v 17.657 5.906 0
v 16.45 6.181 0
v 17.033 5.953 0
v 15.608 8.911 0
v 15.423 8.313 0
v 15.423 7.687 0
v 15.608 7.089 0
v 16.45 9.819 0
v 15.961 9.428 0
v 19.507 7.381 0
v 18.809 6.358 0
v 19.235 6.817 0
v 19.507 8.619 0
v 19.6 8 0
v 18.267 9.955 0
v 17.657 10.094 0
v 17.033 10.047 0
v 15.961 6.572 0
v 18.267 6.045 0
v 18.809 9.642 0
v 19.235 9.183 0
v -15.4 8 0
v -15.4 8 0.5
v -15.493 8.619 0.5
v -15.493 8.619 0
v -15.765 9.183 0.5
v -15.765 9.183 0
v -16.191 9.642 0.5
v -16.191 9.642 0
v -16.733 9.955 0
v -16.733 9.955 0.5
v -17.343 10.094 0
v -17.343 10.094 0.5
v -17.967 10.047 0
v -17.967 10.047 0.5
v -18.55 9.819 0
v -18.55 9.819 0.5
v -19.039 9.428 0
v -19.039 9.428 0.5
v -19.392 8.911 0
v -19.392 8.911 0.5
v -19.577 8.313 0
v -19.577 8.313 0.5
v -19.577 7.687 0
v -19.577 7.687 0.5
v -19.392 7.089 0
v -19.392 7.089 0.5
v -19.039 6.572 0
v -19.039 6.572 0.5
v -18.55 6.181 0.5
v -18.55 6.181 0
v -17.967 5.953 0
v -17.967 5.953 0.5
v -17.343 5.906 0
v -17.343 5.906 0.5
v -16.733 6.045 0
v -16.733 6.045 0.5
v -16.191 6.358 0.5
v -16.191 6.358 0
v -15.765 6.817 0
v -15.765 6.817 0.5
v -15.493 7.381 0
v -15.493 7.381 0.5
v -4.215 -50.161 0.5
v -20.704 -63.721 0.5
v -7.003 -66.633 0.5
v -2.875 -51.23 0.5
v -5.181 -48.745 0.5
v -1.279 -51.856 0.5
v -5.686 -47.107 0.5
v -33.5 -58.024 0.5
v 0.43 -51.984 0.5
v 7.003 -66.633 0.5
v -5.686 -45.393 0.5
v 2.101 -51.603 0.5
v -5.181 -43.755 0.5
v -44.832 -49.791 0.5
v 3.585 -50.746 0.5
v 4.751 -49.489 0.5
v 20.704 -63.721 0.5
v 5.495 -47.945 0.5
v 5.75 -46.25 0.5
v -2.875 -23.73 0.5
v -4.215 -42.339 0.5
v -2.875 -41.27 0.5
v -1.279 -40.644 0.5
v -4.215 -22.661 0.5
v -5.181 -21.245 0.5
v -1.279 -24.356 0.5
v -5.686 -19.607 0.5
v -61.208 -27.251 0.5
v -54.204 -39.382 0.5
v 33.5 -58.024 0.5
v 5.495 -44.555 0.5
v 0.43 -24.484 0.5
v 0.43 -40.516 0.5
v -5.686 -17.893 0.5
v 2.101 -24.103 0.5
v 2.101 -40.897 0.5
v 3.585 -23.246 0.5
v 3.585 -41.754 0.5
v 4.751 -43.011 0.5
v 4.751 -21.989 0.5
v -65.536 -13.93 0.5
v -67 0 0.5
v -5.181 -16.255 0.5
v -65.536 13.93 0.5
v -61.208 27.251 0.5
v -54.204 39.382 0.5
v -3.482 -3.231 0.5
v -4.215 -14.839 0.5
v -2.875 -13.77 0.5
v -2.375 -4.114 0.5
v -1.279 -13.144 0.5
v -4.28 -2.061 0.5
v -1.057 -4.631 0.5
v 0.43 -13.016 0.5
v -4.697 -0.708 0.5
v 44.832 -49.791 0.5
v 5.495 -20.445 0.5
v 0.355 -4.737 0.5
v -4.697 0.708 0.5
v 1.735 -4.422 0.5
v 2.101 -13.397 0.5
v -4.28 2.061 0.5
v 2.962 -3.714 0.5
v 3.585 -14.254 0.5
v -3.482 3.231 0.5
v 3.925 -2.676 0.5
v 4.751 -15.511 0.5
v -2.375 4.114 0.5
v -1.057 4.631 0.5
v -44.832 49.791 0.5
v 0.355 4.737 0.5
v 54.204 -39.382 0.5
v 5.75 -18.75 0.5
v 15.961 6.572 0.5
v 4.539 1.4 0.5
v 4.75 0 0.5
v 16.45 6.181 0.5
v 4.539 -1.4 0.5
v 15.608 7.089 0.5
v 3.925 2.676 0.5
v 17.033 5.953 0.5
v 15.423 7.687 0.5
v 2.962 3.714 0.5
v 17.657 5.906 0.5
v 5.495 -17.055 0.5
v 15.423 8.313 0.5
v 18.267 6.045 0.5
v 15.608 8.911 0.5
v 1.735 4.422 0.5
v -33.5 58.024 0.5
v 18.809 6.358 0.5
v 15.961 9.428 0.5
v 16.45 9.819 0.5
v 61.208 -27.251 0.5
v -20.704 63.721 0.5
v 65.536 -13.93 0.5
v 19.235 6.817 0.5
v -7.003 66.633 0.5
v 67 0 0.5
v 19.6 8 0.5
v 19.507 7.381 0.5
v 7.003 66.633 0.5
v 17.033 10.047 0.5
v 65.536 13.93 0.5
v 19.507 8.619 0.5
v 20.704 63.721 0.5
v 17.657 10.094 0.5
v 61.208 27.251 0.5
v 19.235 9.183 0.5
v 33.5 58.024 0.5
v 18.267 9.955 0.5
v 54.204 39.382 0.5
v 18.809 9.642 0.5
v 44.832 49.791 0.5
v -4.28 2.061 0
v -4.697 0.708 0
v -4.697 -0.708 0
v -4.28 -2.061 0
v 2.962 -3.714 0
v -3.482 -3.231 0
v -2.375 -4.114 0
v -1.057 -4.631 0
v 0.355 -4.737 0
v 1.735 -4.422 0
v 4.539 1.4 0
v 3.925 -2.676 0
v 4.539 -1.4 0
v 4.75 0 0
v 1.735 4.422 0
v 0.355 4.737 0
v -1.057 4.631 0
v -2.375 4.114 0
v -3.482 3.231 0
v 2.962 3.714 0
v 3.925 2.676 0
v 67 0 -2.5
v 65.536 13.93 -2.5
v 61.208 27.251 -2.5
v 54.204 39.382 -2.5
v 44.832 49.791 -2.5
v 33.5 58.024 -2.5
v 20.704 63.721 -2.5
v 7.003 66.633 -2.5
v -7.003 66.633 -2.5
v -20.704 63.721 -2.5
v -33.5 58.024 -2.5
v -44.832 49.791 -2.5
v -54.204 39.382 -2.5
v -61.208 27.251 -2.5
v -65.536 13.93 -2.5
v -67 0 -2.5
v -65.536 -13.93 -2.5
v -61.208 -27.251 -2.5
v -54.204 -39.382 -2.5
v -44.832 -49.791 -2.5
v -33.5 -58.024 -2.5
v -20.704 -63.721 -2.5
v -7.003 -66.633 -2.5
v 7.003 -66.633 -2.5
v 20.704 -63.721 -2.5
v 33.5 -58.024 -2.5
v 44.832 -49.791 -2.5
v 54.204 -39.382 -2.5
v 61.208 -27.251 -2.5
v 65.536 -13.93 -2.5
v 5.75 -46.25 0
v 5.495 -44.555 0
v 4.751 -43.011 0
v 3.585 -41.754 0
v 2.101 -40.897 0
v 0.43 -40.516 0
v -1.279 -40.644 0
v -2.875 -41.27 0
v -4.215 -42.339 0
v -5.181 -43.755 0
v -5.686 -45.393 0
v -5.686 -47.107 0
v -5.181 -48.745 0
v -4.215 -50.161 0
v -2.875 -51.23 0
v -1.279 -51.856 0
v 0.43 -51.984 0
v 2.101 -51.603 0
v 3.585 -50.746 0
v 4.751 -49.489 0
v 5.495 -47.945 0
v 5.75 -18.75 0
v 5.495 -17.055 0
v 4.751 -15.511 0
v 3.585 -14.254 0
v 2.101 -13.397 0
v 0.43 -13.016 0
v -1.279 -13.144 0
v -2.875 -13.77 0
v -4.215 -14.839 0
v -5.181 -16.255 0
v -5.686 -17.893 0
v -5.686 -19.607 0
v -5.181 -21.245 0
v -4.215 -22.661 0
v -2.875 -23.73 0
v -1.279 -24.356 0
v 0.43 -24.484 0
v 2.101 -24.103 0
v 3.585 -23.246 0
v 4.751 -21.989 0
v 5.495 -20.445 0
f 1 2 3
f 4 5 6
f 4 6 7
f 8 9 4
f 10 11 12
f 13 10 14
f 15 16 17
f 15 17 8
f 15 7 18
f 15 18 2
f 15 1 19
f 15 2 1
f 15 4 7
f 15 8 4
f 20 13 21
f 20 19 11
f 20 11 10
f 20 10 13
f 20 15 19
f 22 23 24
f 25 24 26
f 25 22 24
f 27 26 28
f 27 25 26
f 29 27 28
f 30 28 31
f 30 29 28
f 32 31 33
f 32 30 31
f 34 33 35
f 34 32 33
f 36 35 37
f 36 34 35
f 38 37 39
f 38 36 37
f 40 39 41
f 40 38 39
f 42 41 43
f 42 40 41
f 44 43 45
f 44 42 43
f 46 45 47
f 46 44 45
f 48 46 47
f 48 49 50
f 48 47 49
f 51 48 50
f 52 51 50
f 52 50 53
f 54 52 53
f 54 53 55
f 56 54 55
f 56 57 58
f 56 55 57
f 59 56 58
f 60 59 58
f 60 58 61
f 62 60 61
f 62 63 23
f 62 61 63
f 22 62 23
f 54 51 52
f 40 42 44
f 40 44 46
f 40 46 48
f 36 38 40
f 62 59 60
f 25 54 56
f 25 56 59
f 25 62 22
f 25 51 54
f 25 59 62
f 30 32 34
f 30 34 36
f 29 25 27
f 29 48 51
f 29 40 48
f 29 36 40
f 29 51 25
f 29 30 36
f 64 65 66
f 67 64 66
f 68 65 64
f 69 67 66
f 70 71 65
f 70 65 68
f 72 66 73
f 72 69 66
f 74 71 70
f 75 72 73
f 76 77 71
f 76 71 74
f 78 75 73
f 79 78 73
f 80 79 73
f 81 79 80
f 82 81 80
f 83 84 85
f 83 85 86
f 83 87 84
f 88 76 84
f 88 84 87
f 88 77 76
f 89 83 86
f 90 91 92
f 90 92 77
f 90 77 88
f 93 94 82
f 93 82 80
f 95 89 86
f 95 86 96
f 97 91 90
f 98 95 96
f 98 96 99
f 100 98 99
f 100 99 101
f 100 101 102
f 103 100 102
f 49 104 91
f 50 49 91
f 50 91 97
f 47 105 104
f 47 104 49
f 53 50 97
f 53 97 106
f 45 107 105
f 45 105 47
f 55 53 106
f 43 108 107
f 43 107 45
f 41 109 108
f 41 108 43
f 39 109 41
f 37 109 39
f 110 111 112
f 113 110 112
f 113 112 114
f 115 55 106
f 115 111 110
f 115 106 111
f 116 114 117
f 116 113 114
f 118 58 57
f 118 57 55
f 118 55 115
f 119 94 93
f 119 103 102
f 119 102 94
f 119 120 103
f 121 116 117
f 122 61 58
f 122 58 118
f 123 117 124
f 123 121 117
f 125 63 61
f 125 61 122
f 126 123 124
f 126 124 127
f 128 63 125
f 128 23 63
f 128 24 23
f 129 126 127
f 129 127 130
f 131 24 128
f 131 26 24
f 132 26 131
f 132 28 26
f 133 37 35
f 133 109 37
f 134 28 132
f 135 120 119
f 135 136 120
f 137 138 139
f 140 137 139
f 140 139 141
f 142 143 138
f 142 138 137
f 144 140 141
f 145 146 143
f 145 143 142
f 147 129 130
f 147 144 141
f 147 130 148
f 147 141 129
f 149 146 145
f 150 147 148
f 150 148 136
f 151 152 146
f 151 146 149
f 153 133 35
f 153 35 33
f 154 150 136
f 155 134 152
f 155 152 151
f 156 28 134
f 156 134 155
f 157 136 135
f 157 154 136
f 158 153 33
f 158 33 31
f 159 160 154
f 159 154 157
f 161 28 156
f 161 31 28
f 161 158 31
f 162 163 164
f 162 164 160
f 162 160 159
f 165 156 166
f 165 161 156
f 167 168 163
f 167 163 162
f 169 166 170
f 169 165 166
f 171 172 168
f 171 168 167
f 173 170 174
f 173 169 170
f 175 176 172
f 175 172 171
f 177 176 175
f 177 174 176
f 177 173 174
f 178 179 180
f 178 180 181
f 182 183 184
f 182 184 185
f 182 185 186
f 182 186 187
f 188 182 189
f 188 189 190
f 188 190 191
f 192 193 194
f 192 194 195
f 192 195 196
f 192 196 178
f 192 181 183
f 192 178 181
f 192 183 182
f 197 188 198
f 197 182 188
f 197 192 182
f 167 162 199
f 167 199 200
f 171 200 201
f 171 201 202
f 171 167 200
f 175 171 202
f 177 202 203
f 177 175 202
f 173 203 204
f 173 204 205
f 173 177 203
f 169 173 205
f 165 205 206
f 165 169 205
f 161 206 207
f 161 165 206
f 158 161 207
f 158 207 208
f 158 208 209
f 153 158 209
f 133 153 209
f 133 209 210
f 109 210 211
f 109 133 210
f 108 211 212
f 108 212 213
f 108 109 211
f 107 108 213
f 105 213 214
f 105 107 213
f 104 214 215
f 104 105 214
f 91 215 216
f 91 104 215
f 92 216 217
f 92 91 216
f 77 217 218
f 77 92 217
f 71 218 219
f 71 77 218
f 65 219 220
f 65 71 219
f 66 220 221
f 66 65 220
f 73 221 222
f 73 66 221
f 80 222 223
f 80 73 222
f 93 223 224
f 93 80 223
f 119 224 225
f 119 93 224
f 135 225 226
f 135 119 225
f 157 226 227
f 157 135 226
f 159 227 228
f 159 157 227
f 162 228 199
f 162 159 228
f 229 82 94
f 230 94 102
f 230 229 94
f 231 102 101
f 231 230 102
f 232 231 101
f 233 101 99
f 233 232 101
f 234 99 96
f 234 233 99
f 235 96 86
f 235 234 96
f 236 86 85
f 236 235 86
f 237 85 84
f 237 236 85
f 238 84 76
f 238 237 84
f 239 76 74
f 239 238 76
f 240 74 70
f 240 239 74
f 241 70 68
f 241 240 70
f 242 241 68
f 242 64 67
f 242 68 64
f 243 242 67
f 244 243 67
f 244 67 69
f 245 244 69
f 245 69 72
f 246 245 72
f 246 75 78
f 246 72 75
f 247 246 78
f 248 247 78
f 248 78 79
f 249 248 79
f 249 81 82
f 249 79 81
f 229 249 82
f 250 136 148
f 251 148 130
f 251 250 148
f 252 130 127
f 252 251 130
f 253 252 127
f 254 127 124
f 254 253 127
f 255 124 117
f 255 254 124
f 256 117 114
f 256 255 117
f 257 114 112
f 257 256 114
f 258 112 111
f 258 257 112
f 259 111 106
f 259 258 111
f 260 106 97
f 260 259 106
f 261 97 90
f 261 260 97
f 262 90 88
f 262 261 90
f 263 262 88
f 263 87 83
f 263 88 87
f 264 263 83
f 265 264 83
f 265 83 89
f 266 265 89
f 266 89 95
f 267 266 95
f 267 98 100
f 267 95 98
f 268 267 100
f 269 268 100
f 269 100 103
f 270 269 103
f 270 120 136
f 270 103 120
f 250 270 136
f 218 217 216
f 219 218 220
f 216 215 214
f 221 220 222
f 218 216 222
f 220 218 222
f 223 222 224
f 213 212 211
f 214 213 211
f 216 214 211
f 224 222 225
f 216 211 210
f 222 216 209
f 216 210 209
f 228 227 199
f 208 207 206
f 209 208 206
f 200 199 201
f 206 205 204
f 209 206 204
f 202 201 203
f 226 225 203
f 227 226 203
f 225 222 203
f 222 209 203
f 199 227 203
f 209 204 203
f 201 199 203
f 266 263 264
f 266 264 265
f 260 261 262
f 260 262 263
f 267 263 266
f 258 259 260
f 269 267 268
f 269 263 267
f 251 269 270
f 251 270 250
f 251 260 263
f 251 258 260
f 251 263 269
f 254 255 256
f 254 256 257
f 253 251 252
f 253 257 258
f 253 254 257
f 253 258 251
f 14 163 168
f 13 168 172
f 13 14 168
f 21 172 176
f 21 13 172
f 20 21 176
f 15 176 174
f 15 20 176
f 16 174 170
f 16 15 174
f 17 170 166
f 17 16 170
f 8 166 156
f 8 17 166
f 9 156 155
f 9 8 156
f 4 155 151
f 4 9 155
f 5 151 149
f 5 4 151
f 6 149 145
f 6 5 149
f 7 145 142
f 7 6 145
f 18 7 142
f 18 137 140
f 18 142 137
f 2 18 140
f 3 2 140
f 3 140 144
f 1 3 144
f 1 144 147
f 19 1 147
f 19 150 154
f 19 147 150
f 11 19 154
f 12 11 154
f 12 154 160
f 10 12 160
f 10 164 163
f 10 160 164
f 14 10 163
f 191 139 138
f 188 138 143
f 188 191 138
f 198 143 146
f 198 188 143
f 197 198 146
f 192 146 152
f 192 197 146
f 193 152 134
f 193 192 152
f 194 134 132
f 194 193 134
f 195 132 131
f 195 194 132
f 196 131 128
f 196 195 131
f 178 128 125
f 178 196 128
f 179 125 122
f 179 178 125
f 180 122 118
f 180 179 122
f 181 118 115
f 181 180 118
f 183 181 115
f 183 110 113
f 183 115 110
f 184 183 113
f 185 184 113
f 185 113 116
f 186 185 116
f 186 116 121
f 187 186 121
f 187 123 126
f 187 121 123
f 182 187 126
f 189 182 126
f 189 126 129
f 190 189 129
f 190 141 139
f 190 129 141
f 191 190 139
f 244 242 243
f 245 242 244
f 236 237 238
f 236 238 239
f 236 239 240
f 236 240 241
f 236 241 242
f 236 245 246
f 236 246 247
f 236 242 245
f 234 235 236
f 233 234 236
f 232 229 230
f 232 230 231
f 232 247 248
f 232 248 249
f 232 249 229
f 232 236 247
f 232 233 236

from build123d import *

# Parameters (mm, degrees)
F0_R     = 67
F1_DEPTH = 2.5
F4_DEPTH = 2
F6_R     = 2.1
F5_R     = 4.75
F5_R_2   = 5.75
F7_DEPTH = 0.501


# Not quite as in the source:
# - the program builds the solid bodies; features that only make, move or delete a surface that nothing else refers to are left out


with BuildPart() as f1:
    # F0 (on Top) → F1 (new body, symmetric)
    with BuildSketch(Plane.XY):
        Circle(F0_R)
    extrude(amount=F1_DEPTH, both=True)

    # F4 (cut): a face of the model
    f4_faces = [f1.faces().sort_by_distance(p)[0] for p in [
        (0, 0, 2.5),
    ]]
    extrude(f4_faces, amount=-F4_DEPTH, mode=Mode.SUBTRACT)

    # F6 (on Top) + F5 (on Top) → F7 (cut, through all)
    with BuildSketch(Plane.XY):
        with Locations((17.5, 8)):
            Circle(F6_R)
        with Locations((-17.5, 8)):
            Circle(F6_R)
    with BuildSketch(Plane.XY):
        Circle(F5_R)
        with Locations((0, -18.75)):
            Circle(F5_R_2)
        with Locations((0, -46.25)):
            Circle(F5_R_2)
    extrude(amount=F7_DEPTH, mode=Mode.SUBTRACT)


solid = f1.part
